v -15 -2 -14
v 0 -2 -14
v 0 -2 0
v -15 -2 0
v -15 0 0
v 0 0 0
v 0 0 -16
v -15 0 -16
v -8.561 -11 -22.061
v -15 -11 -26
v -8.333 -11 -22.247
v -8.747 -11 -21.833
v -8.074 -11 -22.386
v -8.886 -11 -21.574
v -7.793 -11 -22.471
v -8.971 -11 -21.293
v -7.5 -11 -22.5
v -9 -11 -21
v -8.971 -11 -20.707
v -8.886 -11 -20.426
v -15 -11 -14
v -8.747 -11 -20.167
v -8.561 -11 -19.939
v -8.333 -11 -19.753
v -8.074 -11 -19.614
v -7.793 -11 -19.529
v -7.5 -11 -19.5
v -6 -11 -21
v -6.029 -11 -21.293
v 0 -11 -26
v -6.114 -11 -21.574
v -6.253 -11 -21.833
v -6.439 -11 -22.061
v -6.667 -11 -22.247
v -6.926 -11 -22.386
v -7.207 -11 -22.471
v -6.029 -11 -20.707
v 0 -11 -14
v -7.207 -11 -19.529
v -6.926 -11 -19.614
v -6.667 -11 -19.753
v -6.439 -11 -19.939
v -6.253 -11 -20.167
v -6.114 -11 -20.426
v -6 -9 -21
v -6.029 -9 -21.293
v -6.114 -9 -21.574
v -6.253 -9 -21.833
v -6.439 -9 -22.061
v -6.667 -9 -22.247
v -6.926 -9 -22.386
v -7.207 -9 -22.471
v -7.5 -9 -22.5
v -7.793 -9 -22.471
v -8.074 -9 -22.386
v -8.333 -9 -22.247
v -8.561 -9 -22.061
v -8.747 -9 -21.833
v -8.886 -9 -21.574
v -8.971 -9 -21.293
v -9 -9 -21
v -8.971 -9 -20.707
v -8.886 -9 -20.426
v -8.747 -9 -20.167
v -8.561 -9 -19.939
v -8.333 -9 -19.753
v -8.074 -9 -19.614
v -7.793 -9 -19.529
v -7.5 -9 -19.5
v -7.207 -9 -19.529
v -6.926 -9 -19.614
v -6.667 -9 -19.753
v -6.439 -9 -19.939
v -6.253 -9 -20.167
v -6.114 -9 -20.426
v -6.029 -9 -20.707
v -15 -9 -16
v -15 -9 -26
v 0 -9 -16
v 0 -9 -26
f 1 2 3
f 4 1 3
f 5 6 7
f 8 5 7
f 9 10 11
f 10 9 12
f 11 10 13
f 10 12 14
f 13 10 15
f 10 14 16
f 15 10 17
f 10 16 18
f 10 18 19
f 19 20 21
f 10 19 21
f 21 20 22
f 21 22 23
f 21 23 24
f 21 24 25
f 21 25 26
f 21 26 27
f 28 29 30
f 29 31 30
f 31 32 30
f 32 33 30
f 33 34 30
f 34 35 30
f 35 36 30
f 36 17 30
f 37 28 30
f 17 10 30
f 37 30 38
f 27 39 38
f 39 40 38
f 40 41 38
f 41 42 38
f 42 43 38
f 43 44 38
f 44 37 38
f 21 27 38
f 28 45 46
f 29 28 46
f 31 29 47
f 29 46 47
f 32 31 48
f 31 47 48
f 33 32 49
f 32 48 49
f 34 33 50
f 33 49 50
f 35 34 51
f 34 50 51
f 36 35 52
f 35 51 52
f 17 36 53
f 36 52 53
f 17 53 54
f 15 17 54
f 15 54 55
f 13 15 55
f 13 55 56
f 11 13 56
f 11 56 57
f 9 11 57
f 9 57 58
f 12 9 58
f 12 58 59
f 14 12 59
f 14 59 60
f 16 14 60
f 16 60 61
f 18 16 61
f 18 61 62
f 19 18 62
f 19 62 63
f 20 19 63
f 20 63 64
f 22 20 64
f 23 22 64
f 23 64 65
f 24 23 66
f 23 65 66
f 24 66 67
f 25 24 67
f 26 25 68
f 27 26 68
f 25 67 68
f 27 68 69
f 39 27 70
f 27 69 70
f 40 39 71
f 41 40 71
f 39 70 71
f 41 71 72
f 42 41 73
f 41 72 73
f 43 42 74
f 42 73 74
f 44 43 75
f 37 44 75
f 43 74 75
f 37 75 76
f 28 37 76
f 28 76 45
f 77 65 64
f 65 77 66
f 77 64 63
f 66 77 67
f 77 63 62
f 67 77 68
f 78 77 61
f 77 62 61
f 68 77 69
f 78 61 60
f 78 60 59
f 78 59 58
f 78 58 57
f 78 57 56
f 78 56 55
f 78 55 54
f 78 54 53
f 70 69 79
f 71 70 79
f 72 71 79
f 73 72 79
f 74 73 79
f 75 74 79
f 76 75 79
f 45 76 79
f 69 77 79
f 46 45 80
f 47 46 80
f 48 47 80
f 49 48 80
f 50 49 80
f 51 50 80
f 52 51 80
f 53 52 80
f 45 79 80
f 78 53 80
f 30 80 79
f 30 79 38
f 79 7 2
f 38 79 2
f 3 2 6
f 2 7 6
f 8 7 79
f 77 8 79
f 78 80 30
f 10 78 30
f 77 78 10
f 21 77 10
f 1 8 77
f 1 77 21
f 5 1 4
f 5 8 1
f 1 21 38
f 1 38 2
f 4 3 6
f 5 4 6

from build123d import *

# Parameters (mm, degrees)
BOSS_EXTRUDE1_DEPTH = 15
CUT_EXTRUDE1_REACH  = 4
SKETCH3_R           = 1.5


with BuildPart() as part:
    # Sketch1 → Boss-Extrude1 (new body)
    with BuildSketch(Plane(origin=(0, 0, 0), x_dir=(0, 0, -1), z_dir=(1, 0, 0))):
        Polygon((0, 0), (16, 0), (16, -9), (26, -9), (26, -11), (14, -11), (14, -2), (0, -2), align=None)
    extrude(amount=-BOSS_EXTRUDE1_DEPTH)

    # Sketch3 → Cut-Extrude1 (cut, up to next)
    with BuildSketch(Plane(origin=(0, -9, 0), x_dir=(1, 0, 0), z_dir=(0, 1, 0)), mode=Mode.PRIVATE) as cut_extrude1_sk1:
        with Locations((-7.5, 21)):
            Circle(SKETCH3_R)
    cut_extrude1_tool1 = extrude(cut_extrude1_sk1.sketch, amount=-CUT_EXTRUDE1_REACH, mode=Mode.PRIVATE) & part.part
    add(cut_extrude1_tool1.solids().sort_by_distance((-7.5, -9, -21))[0], mode=Mode.SUBTRACT)


solid = part.part
